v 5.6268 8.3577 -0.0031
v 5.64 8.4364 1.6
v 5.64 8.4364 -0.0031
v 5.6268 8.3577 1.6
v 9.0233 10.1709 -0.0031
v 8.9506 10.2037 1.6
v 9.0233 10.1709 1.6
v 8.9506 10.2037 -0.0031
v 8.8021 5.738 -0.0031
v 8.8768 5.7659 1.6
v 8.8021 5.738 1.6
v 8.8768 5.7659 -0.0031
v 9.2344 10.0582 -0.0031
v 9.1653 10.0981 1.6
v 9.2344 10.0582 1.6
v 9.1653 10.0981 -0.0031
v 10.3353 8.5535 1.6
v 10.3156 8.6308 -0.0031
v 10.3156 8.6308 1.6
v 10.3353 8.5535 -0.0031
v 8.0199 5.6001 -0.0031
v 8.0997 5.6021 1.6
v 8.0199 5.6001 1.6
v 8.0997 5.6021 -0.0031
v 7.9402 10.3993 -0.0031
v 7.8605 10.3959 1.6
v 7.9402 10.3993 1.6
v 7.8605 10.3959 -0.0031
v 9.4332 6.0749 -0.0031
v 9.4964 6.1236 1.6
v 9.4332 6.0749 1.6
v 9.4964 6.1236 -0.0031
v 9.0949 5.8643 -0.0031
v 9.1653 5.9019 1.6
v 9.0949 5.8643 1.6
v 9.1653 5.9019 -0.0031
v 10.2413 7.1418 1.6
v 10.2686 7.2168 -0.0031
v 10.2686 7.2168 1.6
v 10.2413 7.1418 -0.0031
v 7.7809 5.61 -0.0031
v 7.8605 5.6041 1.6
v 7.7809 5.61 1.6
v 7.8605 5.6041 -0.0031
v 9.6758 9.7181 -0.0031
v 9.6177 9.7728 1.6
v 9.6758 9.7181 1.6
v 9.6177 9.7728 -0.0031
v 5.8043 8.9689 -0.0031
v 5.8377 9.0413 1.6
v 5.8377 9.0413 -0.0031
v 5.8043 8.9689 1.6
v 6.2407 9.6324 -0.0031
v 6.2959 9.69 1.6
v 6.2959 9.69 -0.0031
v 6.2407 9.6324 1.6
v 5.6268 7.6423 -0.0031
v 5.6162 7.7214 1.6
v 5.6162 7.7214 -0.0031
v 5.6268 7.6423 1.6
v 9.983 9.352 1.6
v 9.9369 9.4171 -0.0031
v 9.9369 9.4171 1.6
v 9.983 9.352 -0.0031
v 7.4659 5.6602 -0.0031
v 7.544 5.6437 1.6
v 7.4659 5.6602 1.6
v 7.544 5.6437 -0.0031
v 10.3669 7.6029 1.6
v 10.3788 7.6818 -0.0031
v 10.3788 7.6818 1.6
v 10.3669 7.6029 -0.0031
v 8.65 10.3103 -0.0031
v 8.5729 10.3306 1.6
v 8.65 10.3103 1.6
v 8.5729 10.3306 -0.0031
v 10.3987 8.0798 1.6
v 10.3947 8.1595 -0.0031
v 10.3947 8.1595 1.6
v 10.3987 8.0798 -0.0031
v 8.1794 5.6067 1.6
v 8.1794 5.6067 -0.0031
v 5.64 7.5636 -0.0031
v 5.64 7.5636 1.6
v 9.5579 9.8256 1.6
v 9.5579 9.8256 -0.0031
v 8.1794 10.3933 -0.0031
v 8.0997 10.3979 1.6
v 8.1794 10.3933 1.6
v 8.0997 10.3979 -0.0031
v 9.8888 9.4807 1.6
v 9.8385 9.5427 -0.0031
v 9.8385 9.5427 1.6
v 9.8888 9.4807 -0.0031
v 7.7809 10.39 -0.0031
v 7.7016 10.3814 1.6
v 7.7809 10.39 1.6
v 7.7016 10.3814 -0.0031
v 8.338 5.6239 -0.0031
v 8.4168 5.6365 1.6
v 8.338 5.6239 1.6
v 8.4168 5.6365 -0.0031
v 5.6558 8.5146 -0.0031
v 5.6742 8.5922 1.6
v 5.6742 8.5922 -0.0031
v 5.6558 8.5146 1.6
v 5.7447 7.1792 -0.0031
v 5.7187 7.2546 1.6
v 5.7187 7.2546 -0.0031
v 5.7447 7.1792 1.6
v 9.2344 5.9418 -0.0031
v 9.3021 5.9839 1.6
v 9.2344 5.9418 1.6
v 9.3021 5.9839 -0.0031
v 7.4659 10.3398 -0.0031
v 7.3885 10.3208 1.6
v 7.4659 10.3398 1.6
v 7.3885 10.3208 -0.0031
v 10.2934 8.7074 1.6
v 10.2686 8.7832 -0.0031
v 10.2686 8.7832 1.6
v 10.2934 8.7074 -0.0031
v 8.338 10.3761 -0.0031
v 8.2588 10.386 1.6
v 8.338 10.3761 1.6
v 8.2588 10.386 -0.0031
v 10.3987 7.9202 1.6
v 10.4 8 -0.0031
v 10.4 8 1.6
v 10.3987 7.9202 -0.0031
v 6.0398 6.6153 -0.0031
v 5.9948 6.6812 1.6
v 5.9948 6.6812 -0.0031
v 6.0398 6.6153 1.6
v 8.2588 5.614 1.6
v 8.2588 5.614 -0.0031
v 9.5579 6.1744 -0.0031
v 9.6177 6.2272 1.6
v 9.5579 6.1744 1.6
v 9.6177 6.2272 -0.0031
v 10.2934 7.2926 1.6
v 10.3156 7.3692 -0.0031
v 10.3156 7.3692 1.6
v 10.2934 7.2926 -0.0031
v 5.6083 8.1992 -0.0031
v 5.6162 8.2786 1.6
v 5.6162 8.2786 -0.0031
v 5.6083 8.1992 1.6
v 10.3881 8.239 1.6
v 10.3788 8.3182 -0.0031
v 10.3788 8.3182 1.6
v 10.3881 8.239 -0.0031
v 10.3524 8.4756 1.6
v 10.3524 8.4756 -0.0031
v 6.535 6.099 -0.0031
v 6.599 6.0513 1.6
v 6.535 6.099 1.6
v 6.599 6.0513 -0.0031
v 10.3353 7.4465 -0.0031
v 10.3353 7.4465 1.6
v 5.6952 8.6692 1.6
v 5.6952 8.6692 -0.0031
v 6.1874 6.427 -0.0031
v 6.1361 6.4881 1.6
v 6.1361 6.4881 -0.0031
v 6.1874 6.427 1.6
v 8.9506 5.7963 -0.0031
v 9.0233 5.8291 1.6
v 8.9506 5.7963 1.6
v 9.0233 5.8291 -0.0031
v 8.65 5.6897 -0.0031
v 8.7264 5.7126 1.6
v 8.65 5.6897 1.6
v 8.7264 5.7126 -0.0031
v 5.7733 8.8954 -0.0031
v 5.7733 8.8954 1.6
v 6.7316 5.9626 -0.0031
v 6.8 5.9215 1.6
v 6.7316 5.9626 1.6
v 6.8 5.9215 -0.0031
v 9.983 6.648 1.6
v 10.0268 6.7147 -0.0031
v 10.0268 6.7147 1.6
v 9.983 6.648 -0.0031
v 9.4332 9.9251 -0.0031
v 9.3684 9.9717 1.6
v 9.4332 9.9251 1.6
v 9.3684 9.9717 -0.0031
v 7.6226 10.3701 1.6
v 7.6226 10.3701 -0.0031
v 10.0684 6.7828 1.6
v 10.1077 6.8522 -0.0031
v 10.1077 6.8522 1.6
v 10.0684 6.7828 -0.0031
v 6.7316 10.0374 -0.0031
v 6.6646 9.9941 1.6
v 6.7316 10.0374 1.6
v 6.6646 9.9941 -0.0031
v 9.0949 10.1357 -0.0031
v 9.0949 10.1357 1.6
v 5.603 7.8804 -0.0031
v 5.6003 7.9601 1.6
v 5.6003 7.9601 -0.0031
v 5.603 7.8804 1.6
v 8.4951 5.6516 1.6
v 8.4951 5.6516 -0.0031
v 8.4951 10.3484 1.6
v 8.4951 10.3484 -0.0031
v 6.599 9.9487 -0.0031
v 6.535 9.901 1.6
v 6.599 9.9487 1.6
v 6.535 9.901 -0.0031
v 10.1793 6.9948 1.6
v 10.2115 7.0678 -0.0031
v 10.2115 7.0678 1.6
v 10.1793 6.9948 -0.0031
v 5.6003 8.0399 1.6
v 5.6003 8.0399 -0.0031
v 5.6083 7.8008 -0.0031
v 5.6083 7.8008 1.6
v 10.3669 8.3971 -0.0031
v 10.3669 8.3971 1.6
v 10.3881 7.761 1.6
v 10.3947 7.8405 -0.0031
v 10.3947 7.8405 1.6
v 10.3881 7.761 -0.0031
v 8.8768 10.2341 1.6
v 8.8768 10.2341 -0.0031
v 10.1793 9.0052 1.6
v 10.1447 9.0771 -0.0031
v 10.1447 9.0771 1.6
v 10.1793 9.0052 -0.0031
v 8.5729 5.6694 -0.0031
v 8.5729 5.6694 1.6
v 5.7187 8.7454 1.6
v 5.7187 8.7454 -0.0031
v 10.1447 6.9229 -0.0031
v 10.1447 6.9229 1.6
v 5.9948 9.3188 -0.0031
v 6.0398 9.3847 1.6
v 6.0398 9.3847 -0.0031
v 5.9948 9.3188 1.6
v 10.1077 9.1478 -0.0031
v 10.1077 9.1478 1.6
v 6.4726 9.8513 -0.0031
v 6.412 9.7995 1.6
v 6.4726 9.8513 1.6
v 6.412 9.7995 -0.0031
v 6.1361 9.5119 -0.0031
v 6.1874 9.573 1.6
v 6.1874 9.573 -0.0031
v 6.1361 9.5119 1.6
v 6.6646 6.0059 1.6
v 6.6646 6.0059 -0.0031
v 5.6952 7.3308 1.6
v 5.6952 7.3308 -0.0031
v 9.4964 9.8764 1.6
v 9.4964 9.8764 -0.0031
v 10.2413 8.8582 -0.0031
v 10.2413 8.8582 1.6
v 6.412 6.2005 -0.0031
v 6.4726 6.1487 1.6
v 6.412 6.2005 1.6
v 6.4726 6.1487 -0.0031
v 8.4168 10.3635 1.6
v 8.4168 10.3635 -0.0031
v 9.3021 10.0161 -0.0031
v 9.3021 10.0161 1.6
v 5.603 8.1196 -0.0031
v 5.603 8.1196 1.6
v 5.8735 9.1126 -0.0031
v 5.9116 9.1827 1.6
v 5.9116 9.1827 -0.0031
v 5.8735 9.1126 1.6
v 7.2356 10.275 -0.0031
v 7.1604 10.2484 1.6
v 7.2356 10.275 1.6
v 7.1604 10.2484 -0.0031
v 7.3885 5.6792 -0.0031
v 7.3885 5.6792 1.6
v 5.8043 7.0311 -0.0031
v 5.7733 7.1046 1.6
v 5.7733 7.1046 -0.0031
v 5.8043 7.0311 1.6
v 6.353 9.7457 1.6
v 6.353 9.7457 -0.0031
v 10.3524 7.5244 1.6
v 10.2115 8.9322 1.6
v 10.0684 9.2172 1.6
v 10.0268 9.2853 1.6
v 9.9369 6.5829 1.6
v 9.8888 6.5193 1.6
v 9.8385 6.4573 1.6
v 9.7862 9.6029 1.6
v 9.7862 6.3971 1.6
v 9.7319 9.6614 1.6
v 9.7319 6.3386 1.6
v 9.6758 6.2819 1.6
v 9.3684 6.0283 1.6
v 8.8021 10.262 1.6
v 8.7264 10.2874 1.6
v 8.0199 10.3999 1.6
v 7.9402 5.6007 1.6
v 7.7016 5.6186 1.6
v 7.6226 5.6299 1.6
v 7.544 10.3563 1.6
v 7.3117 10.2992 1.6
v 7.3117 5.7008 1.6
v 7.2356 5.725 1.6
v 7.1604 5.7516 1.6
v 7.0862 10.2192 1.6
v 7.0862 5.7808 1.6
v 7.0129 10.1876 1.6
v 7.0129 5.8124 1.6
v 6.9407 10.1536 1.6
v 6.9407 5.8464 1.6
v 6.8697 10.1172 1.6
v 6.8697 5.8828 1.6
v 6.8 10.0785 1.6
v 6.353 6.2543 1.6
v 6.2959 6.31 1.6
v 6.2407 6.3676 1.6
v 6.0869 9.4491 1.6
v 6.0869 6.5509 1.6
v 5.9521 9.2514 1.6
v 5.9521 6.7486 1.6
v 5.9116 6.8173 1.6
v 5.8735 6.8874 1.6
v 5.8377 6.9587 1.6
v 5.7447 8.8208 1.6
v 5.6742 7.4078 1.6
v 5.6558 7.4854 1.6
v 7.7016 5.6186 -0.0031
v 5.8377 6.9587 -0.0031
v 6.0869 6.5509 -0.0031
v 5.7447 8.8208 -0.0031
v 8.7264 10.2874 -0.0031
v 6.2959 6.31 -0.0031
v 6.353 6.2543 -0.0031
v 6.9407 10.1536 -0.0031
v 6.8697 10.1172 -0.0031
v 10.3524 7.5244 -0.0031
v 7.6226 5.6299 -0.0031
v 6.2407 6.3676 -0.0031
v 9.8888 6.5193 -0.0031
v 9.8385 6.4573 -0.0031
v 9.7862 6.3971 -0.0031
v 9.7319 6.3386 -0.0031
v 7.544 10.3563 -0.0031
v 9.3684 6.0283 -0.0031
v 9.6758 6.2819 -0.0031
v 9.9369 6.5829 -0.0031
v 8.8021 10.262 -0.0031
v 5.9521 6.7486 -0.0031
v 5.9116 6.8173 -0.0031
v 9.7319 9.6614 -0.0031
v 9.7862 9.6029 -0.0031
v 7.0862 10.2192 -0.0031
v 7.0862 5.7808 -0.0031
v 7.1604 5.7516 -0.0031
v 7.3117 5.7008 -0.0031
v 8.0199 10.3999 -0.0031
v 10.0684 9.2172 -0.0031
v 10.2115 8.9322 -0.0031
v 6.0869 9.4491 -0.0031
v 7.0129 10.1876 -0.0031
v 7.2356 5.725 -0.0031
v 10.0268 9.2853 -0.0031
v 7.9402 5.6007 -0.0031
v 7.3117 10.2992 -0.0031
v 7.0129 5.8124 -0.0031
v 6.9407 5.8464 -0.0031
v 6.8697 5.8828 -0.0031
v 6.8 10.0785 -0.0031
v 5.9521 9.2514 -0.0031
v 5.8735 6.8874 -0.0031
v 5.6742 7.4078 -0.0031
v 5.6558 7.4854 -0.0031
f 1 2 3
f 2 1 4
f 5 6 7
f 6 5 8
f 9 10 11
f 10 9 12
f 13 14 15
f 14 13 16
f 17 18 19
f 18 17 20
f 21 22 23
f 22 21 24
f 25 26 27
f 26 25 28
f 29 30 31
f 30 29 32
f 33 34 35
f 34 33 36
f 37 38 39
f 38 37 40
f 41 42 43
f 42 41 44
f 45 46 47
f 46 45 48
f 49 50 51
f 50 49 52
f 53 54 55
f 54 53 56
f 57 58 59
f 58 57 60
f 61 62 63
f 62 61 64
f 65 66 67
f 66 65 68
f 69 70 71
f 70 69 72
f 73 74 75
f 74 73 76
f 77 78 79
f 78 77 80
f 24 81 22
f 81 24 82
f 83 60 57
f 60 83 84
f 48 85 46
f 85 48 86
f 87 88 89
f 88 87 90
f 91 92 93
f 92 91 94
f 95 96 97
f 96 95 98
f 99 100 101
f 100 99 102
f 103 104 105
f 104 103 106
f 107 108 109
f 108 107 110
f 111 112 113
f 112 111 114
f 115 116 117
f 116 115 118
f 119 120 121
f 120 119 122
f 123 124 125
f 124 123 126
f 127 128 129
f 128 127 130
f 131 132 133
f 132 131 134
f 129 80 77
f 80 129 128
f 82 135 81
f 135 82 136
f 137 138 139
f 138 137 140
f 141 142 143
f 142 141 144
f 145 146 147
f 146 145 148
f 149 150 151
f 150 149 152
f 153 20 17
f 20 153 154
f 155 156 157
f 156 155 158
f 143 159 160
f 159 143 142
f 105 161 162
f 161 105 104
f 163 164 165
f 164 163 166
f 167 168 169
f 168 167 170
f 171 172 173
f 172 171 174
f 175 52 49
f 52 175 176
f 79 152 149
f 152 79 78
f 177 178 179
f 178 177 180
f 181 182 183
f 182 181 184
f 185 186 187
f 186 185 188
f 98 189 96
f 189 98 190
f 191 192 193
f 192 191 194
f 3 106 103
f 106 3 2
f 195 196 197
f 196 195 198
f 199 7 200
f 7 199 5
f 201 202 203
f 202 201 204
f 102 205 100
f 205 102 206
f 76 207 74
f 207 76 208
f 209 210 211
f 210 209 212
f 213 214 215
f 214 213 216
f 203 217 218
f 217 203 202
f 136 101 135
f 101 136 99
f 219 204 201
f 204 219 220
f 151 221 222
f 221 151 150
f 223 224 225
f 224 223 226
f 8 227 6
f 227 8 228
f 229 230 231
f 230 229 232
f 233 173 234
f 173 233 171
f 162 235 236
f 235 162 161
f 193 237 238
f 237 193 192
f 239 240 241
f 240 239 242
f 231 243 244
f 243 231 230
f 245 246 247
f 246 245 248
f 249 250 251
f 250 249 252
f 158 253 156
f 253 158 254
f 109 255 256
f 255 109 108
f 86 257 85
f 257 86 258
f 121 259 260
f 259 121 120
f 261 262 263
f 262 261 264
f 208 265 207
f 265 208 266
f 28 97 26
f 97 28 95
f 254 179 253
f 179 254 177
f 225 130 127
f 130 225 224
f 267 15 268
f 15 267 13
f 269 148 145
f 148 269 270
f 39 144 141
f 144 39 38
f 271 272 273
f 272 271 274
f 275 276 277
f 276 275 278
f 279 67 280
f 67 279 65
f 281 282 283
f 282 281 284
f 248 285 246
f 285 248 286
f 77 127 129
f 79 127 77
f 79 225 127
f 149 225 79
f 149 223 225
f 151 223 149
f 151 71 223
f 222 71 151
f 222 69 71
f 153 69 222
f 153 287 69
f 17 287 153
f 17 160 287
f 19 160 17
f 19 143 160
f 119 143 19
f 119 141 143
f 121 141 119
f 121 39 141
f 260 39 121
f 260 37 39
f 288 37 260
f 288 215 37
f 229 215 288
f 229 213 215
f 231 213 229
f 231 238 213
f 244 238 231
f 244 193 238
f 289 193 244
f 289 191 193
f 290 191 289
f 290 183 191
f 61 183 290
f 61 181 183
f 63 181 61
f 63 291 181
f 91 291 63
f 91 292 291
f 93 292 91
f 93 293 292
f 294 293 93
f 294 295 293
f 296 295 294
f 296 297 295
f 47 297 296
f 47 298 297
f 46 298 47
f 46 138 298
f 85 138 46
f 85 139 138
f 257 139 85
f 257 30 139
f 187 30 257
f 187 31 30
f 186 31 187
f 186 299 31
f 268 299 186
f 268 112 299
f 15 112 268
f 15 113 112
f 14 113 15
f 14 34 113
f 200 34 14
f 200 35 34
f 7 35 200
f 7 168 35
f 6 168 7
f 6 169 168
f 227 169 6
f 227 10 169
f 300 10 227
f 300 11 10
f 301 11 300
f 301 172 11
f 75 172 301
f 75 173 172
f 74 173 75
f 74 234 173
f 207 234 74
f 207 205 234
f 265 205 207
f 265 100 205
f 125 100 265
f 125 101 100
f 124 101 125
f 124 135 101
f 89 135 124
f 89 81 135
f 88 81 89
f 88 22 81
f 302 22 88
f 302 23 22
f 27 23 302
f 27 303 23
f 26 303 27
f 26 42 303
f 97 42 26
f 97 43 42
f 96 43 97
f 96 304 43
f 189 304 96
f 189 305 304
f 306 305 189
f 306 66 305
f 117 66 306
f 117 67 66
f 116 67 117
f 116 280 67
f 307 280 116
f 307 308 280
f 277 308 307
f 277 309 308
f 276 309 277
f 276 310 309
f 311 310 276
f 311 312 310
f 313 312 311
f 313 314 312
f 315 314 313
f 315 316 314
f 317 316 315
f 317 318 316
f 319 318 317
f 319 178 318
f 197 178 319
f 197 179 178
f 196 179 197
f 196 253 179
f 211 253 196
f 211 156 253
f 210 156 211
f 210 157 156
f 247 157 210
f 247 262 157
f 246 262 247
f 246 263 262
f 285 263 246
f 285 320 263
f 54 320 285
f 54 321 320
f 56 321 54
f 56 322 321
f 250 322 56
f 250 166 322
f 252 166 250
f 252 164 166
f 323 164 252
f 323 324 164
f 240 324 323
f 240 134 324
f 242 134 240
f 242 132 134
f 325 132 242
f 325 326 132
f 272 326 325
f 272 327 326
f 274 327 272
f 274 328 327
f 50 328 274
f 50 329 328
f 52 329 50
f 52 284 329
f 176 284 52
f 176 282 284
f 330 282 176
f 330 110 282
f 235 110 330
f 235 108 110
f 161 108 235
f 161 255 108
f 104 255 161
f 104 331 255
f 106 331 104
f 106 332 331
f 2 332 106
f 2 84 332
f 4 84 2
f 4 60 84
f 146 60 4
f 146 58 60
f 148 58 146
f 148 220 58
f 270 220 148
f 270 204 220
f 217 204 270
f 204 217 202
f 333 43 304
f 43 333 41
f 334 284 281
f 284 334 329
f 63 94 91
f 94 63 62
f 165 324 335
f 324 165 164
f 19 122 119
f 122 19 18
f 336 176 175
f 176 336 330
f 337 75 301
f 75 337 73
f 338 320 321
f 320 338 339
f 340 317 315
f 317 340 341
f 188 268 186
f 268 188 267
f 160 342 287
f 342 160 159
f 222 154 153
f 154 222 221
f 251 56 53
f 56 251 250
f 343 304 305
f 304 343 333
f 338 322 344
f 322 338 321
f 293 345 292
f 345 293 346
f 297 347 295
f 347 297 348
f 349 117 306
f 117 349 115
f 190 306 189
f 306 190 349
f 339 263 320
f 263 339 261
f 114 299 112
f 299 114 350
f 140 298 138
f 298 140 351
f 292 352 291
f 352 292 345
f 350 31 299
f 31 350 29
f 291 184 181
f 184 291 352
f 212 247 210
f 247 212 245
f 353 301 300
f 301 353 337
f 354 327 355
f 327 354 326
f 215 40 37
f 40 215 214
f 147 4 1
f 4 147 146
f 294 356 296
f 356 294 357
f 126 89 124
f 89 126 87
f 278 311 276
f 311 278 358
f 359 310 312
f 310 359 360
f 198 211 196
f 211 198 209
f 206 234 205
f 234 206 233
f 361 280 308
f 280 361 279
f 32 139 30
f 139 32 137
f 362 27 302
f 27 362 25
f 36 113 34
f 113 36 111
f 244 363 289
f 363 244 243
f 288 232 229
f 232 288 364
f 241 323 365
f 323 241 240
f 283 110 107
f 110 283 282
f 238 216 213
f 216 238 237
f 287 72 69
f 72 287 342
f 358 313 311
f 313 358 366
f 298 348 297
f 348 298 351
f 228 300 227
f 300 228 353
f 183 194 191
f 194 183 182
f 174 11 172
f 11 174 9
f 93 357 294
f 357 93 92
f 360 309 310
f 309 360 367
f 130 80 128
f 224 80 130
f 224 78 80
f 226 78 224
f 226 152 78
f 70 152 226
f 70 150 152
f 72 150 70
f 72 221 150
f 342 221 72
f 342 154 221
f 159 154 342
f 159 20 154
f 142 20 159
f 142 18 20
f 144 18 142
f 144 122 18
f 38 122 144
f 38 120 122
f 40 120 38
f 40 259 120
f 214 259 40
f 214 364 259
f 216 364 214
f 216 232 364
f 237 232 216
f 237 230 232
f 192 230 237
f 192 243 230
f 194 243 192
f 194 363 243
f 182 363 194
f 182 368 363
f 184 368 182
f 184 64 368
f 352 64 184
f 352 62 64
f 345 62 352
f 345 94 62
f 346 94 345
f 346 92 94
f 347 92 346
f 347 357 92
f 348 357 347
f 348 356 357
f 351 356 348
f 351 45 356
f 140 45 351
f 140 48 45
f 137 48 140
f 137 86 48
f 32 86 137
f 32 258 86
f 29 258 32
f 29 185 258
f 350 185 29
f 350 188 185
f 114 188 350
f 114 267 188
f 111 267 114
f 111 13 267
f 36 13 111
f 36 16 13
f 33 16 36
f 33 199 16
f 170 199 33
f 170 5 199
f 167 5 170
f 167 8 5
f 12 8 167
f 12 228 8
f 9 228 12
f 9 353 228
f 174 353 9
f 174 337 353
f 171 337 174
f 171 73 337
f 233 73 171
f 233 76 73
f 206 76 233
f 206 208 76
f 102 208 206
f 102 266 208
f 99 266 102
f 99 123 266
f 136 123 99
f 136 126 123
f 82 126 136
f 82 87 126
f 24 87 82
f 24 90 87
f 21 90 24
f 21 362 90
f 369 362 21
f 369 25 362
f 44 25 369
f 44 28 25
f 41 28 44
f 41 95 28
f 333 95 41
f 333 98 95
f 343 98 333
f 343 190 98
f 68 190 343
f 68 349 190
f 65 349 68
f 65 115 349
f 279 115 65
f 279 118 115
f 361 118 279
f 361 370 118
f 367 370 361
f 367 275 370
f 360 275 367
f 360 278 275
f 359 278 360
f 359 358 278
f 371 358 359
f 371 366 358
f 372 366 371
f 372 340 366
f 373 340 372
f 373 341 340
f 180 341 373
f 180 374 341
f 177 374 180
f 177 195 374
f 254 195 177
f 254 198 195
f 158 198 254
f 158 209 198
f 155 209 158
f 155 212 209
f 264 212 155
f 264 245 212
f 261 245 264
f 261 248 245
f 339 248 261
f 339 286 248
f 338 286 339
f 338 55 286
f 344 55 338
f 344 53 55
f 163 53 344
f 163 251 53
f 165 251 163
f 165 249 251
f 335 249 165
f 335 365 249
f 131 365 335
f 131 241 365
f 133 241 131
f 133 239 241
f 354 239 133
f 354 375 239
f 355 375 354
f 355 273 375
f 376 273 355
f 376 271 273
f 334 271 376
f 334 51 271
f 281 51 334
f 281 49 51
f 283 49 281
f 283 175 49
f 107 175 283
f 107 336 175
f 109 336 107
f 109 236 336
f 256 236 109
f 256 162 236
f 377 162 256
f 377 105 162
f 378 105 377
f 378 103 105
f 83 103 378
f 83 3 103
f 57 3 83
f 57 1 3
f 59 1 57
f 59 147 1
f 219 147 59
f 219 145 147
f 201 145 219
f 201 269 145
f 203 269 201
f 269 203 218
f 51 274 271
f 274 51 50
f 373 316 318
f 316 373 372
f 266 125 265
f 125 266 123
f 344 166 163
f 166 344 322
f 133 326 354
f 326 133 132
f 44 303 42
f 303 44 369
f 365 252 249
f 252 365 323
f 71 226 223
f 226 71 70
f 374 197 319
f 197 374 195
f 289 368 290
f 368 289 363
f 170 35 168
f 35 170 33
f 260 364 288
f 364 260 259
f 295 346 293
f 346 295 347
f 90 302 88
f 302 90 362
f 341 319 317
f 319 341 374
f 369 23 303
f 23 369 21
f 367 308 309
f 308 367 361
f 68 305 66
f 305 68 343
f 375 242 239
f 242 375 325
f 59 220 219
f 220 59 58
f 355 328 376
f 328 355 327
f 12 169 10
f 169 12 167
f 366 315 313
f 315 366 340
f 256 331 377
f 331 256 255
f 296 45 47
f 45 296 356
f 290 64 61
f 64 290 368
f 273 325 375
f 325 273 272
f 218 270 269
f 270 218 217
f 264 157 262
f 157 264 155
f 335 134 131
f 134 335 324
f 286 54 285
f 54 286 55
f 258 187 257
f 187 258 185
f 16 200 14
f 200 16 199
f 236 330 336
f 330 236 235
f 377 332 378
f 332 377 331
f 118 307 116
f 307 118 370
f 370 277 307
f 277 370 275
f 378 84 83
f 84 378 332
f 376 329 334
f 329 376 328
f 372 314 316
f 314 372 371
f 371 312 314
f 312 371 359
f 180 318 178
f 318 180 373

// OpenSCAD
use <../lib.scad>
use <../p/1-4cylc.scad>
use <../p/1-4cyli.scad>
use <../p/1-4ndis.scad>
use <../p/4-4cyli.scad>
use <../p/4-4cyls.scad>
use <../p/box2-5.scad>
use <../p/rect2p.scad>
use <s/2464s01.scad>
use <../p/stud.scad>
use <../p/stud2a.scad>
$fa=1; $fs=0.2;
function ldraw_lib__2464(realsolid=false) = [
// 0 Brick  3 x  3 x  2 Facet Bottom
// 0 Name: 2464.dat
// 0 Author: Luis E. Fernandez [lfernand]
// 0 !LDRAW_ORG Part UPDATE 2010-03
// 0 !LICENSE Licensed under CC BY 2.0 and CC BY 4.0 : see CAreadme.txt
// 
// 0 BFC CERTIFY CCW
  [0,"BFC","CERTIFY"],
  [0,"BFC","CCW"],
// 
// 0 !HISTORY 1998-02-12 [PTadmin] Official Update 1998-02
// 0 !HISTORY 2007-05-10 [PTadmin] Header formatted for Contributor Agreement
// 0 !HISTORY 2007-05-22 [dulcaoin] Fixed and add some edge lines (still needs further work)
// 0 !HISTORY 2008-07-01 [PTadmin] Official Update 2008-01
// 0 !HISTORY 2010-07-11 [MagFors] Completed the design, BFC'ed, subfiled
// 0 !HISTORY 2010-12-31 [PTadmin] Official Update 2010-03
// 
// 
// 2 24 10 24 18 18 24 10
  [2,24,10,24,18,18,24,10],
// 2 24 -11 12 13 13 12 -11
  [2,24,-11,12,13,13,12,-11],
// 2 24 30 0 30 30 24 30
  [2,24,30,0,30,30,24,30],
// 2 24 -4.25 10 8 8 10 -4.25
  [2,24,-4.25,10,8,8,10,-4.25],
// 2 24 8 -24 8 8 15.5 8
  [2,24,8,-24,8,8,15.5,8],
// 2 24 10 0 10 10 -24 10
  [2,24,10,0,10,10,-24,10],
// 2 24 26 24 26 26 4 26
  [2,24,26,24,26,26,4,26],
// 0 // surface
// 1 16 -10 -22 -10 -20 1 0 0 0 2 20 1 0 rect2p.dat
  [1,16,-10,-22,-10,-20,1,0,0,0,2,20,1,0, ldraw_lib__rect2p(realsolid)],
// 4 16 -30 -20 10 -11 12 13 13 12 -11 10 -20 -30
  [4,16,-30,-20,10,-11,12,13,13,12,-11,10,-20,-30],
// 4 16 -11 12 13 3.843 20 15.4903 15.4903 20 3.843 13 12 -11
  [4,16,-11,12,13,3.843,20,15.4903,15.4903,20,3.843,13,12,-11],
// 4 16 3.843 20 15.4903 4.2426 20.3077 15.7574 15.7574 20.3077 4.2426 15.4903 20 3.843
  [4,16,3.843,20,15.4903,4.2426,20.3077,15.7574,15.7574,20.3077,4.2426,15.4903,20,3.843],
// 4 16 4.2426 20.3077 15.7574 10 24 18 18 24 10 15.7574 20.3077 4.2426
  [4,16,4.2426,20.3077,15.7574,10,24,18,18,24,10,15.7574,20.3077,4.2426],
// 4 16 10 -24 -30 11 -24 -28 -28 -24 11 -30 -24 10
  [4,16,10,-24,-30,11,-24,-28,-28,-24,11,-30,-24,10],
// 1 16 -8.5 -22 -8.5 -19.5 -1 0 0 0 -2 19.5 -1 0 rect2p.dat
  [1,16,-8.5,-22,-8.5,-19.5,-1,0,0,0,-2,19.5,-1,0, ldraw_lib__rect2p(realsolid)],
// 4 16 11 -20 -28 8 -1 -12 -12 -1 8 -28 -20 11
  [4,16,11,-20,-28,8,-1,-12,-12,-1,8,-28,-20,11],
// 4 16 -12 -1 8 8 -1 -12 8 10 -4.25 -4.25 10 8
  [4,16,-12,-1,8,8,-1,-12,8,10,-4.25,-4.25,10,8],
// 5 24 8 -1 -12 -12 -1 8 11 -20 -28 8 10 -4.25
  [5,24,8,-1,-12,-12,-1,8,11,-20,-28,8,10,-4.25],
// 3 16 8 15.5 8 -4.25 10 8 8 10 -4.25
  [3,16,8,15.5,8,-4.25,10,8,8,10,-4.25],
// 1 16 19 8.75 19 0 -9 0 -8.75 0 0 0 0 -9 box2-5.dat
  [1,16,19,8.75,19,0,-9,0,-8.75,0,0,0,0,-9, ldraw_lib__box2_5(realsolid)],
// 1 16 20 24 20 0 0 -6 0 -1 0 -6 0 0 1-4ndis.dat
  [1,16,20,24,20,0,0,-6,0,-1,0,-6,0,0, ldraw_lib__1_4ndis(realsolid)],
// 0 BFC INVERTNEXT
  [0,"BFC","INVERTNEXT"],
// 1 16 20 4 20 -6 0 0 0 20 0 0 0 -6 1-4cylc.dat
  [1,16,20,4,20,-6,0,0,0,20,0,0,0,-6, ldraw_lib__1_4cylc(realsolid)],
// 4 16 10 0 28 10 0 10 28 0 10 30 0 30
  [4,16,10,0,28,10,0,10,28,0,10,30,0,30],
// 0 //
// 1 16 20 -24 20 0 0 1 0 1 0 1 0 0 s\2464s01.dat
  [1,16,20,-24,20,0,0,1,0,1,0,1,0,0, ldraw_lib__s__2464s01(realsolid)],
// 1 16 20 -24 20 1 0 0 0 1 0 0 0 1 s\2464s01.dat
  [1,16,20,-24,20,1,0,0,0,1,0,0,0,1, ldraw_lib__s__2464s01(realsolid)],
// 0 // studs
// 1 16 -20 -24 20 1 0 0 0 1 0 0 0 1 stud2a.dat
  [1,16,-20,-24,20,1,0,0,0,1,0,0,0,1, ldraw_lib__stud2a(realsolid)],
// 1 16 20 -24 -20 1 0 0 0 1 0 0 0 1 stud2a.dat
  [1,16,20,-24,-20,1,0,0,0,1,0,0,0,1, ldraw_lib__stud2a(realsolid)],
// 1 16 0 0 20 1 0 0 0 1 0 0 0 1 stud2a.dat
  [1,16,0,0,20,1,0,0,0,1,0,0,0,1, ldraw_lib__stud2a(realsolid)],
// 1 16 20 0 0 1 0 0 0 1 0 0 0 1 stud2a.dat
  [1,16,20,0,0,1,0,0,0,1,0,0,0,1, ldraw_lib__stud2a(realsolid)],
// 1 16 20 0 20 0 0 -1 0 1 0 1 0 0 stud.dat
  [1,16,20,0,20,0,0,-1,0,1,0,1,0,0, ldraw_lib__stud(realsolid)],
// 0 BFC INVERTNEXT
  [0,"BFC","INVERTNEXT"],
// 1 16 0 -3 0 -2.84 0 2.84 0 8 0 -2.84 0 -2.84 4-4cyls.dat
  [1,16,0,-3,0,-2.84,0,2.84,0,8,0,-2.84,0,-2.84, ldraw_lib__4_4cyls(realsolid)],
// 0 BFC INVERTNEXT
  [0,"BFC","INVERTNEXT"],
// 1 16 0 -24 0 -2.84 0 2.84 0 21 0 2.84 0 2.84 4-4cyli.dat
  [1,16,0,-24,0,-2.84,0,2.84,0,21,0,2.84,0,2.84, ldraw_lib__4_4cyli(realsolid)],
// 1 16 0 -7 0 0 0 6.02455 0 20.5 0 6.02455 0 0 1-4cyli.dat
  [1,16,0,-7,0,0,0,6.02455,0,20.5,0,6.02455,0,0, ldraw_lib__1_4cyli(realsolid)],
// 1 16 0 -24 0 6 0 0 0 17.5 0 0 0 6 4-4cyli.dat
  [1,16,0,-24,0,6,0,0,0,17.5,0,0,0,6, ldraw_lib__4_4cyli(realsolid)],
// 1 16 0 -24 0 1 0 0 0 1 0 0 0 1 stud2a.dat
  [1,16,0,-24,0,1,0,0,0,1,0,0,0,1, ldraw_lib__stud2a(realsolid)],
];
module ldraw_lib__2464(step=0, col=false, unit=2/5, alt=false, line=0.2, solid=!$preview)
    makepoly(ldraw_lib__2464(solid), step=step, col=col, unit=unit, alt=alt, line=line, solid=solid);
ldraw_lib__2464(line=0.2);
